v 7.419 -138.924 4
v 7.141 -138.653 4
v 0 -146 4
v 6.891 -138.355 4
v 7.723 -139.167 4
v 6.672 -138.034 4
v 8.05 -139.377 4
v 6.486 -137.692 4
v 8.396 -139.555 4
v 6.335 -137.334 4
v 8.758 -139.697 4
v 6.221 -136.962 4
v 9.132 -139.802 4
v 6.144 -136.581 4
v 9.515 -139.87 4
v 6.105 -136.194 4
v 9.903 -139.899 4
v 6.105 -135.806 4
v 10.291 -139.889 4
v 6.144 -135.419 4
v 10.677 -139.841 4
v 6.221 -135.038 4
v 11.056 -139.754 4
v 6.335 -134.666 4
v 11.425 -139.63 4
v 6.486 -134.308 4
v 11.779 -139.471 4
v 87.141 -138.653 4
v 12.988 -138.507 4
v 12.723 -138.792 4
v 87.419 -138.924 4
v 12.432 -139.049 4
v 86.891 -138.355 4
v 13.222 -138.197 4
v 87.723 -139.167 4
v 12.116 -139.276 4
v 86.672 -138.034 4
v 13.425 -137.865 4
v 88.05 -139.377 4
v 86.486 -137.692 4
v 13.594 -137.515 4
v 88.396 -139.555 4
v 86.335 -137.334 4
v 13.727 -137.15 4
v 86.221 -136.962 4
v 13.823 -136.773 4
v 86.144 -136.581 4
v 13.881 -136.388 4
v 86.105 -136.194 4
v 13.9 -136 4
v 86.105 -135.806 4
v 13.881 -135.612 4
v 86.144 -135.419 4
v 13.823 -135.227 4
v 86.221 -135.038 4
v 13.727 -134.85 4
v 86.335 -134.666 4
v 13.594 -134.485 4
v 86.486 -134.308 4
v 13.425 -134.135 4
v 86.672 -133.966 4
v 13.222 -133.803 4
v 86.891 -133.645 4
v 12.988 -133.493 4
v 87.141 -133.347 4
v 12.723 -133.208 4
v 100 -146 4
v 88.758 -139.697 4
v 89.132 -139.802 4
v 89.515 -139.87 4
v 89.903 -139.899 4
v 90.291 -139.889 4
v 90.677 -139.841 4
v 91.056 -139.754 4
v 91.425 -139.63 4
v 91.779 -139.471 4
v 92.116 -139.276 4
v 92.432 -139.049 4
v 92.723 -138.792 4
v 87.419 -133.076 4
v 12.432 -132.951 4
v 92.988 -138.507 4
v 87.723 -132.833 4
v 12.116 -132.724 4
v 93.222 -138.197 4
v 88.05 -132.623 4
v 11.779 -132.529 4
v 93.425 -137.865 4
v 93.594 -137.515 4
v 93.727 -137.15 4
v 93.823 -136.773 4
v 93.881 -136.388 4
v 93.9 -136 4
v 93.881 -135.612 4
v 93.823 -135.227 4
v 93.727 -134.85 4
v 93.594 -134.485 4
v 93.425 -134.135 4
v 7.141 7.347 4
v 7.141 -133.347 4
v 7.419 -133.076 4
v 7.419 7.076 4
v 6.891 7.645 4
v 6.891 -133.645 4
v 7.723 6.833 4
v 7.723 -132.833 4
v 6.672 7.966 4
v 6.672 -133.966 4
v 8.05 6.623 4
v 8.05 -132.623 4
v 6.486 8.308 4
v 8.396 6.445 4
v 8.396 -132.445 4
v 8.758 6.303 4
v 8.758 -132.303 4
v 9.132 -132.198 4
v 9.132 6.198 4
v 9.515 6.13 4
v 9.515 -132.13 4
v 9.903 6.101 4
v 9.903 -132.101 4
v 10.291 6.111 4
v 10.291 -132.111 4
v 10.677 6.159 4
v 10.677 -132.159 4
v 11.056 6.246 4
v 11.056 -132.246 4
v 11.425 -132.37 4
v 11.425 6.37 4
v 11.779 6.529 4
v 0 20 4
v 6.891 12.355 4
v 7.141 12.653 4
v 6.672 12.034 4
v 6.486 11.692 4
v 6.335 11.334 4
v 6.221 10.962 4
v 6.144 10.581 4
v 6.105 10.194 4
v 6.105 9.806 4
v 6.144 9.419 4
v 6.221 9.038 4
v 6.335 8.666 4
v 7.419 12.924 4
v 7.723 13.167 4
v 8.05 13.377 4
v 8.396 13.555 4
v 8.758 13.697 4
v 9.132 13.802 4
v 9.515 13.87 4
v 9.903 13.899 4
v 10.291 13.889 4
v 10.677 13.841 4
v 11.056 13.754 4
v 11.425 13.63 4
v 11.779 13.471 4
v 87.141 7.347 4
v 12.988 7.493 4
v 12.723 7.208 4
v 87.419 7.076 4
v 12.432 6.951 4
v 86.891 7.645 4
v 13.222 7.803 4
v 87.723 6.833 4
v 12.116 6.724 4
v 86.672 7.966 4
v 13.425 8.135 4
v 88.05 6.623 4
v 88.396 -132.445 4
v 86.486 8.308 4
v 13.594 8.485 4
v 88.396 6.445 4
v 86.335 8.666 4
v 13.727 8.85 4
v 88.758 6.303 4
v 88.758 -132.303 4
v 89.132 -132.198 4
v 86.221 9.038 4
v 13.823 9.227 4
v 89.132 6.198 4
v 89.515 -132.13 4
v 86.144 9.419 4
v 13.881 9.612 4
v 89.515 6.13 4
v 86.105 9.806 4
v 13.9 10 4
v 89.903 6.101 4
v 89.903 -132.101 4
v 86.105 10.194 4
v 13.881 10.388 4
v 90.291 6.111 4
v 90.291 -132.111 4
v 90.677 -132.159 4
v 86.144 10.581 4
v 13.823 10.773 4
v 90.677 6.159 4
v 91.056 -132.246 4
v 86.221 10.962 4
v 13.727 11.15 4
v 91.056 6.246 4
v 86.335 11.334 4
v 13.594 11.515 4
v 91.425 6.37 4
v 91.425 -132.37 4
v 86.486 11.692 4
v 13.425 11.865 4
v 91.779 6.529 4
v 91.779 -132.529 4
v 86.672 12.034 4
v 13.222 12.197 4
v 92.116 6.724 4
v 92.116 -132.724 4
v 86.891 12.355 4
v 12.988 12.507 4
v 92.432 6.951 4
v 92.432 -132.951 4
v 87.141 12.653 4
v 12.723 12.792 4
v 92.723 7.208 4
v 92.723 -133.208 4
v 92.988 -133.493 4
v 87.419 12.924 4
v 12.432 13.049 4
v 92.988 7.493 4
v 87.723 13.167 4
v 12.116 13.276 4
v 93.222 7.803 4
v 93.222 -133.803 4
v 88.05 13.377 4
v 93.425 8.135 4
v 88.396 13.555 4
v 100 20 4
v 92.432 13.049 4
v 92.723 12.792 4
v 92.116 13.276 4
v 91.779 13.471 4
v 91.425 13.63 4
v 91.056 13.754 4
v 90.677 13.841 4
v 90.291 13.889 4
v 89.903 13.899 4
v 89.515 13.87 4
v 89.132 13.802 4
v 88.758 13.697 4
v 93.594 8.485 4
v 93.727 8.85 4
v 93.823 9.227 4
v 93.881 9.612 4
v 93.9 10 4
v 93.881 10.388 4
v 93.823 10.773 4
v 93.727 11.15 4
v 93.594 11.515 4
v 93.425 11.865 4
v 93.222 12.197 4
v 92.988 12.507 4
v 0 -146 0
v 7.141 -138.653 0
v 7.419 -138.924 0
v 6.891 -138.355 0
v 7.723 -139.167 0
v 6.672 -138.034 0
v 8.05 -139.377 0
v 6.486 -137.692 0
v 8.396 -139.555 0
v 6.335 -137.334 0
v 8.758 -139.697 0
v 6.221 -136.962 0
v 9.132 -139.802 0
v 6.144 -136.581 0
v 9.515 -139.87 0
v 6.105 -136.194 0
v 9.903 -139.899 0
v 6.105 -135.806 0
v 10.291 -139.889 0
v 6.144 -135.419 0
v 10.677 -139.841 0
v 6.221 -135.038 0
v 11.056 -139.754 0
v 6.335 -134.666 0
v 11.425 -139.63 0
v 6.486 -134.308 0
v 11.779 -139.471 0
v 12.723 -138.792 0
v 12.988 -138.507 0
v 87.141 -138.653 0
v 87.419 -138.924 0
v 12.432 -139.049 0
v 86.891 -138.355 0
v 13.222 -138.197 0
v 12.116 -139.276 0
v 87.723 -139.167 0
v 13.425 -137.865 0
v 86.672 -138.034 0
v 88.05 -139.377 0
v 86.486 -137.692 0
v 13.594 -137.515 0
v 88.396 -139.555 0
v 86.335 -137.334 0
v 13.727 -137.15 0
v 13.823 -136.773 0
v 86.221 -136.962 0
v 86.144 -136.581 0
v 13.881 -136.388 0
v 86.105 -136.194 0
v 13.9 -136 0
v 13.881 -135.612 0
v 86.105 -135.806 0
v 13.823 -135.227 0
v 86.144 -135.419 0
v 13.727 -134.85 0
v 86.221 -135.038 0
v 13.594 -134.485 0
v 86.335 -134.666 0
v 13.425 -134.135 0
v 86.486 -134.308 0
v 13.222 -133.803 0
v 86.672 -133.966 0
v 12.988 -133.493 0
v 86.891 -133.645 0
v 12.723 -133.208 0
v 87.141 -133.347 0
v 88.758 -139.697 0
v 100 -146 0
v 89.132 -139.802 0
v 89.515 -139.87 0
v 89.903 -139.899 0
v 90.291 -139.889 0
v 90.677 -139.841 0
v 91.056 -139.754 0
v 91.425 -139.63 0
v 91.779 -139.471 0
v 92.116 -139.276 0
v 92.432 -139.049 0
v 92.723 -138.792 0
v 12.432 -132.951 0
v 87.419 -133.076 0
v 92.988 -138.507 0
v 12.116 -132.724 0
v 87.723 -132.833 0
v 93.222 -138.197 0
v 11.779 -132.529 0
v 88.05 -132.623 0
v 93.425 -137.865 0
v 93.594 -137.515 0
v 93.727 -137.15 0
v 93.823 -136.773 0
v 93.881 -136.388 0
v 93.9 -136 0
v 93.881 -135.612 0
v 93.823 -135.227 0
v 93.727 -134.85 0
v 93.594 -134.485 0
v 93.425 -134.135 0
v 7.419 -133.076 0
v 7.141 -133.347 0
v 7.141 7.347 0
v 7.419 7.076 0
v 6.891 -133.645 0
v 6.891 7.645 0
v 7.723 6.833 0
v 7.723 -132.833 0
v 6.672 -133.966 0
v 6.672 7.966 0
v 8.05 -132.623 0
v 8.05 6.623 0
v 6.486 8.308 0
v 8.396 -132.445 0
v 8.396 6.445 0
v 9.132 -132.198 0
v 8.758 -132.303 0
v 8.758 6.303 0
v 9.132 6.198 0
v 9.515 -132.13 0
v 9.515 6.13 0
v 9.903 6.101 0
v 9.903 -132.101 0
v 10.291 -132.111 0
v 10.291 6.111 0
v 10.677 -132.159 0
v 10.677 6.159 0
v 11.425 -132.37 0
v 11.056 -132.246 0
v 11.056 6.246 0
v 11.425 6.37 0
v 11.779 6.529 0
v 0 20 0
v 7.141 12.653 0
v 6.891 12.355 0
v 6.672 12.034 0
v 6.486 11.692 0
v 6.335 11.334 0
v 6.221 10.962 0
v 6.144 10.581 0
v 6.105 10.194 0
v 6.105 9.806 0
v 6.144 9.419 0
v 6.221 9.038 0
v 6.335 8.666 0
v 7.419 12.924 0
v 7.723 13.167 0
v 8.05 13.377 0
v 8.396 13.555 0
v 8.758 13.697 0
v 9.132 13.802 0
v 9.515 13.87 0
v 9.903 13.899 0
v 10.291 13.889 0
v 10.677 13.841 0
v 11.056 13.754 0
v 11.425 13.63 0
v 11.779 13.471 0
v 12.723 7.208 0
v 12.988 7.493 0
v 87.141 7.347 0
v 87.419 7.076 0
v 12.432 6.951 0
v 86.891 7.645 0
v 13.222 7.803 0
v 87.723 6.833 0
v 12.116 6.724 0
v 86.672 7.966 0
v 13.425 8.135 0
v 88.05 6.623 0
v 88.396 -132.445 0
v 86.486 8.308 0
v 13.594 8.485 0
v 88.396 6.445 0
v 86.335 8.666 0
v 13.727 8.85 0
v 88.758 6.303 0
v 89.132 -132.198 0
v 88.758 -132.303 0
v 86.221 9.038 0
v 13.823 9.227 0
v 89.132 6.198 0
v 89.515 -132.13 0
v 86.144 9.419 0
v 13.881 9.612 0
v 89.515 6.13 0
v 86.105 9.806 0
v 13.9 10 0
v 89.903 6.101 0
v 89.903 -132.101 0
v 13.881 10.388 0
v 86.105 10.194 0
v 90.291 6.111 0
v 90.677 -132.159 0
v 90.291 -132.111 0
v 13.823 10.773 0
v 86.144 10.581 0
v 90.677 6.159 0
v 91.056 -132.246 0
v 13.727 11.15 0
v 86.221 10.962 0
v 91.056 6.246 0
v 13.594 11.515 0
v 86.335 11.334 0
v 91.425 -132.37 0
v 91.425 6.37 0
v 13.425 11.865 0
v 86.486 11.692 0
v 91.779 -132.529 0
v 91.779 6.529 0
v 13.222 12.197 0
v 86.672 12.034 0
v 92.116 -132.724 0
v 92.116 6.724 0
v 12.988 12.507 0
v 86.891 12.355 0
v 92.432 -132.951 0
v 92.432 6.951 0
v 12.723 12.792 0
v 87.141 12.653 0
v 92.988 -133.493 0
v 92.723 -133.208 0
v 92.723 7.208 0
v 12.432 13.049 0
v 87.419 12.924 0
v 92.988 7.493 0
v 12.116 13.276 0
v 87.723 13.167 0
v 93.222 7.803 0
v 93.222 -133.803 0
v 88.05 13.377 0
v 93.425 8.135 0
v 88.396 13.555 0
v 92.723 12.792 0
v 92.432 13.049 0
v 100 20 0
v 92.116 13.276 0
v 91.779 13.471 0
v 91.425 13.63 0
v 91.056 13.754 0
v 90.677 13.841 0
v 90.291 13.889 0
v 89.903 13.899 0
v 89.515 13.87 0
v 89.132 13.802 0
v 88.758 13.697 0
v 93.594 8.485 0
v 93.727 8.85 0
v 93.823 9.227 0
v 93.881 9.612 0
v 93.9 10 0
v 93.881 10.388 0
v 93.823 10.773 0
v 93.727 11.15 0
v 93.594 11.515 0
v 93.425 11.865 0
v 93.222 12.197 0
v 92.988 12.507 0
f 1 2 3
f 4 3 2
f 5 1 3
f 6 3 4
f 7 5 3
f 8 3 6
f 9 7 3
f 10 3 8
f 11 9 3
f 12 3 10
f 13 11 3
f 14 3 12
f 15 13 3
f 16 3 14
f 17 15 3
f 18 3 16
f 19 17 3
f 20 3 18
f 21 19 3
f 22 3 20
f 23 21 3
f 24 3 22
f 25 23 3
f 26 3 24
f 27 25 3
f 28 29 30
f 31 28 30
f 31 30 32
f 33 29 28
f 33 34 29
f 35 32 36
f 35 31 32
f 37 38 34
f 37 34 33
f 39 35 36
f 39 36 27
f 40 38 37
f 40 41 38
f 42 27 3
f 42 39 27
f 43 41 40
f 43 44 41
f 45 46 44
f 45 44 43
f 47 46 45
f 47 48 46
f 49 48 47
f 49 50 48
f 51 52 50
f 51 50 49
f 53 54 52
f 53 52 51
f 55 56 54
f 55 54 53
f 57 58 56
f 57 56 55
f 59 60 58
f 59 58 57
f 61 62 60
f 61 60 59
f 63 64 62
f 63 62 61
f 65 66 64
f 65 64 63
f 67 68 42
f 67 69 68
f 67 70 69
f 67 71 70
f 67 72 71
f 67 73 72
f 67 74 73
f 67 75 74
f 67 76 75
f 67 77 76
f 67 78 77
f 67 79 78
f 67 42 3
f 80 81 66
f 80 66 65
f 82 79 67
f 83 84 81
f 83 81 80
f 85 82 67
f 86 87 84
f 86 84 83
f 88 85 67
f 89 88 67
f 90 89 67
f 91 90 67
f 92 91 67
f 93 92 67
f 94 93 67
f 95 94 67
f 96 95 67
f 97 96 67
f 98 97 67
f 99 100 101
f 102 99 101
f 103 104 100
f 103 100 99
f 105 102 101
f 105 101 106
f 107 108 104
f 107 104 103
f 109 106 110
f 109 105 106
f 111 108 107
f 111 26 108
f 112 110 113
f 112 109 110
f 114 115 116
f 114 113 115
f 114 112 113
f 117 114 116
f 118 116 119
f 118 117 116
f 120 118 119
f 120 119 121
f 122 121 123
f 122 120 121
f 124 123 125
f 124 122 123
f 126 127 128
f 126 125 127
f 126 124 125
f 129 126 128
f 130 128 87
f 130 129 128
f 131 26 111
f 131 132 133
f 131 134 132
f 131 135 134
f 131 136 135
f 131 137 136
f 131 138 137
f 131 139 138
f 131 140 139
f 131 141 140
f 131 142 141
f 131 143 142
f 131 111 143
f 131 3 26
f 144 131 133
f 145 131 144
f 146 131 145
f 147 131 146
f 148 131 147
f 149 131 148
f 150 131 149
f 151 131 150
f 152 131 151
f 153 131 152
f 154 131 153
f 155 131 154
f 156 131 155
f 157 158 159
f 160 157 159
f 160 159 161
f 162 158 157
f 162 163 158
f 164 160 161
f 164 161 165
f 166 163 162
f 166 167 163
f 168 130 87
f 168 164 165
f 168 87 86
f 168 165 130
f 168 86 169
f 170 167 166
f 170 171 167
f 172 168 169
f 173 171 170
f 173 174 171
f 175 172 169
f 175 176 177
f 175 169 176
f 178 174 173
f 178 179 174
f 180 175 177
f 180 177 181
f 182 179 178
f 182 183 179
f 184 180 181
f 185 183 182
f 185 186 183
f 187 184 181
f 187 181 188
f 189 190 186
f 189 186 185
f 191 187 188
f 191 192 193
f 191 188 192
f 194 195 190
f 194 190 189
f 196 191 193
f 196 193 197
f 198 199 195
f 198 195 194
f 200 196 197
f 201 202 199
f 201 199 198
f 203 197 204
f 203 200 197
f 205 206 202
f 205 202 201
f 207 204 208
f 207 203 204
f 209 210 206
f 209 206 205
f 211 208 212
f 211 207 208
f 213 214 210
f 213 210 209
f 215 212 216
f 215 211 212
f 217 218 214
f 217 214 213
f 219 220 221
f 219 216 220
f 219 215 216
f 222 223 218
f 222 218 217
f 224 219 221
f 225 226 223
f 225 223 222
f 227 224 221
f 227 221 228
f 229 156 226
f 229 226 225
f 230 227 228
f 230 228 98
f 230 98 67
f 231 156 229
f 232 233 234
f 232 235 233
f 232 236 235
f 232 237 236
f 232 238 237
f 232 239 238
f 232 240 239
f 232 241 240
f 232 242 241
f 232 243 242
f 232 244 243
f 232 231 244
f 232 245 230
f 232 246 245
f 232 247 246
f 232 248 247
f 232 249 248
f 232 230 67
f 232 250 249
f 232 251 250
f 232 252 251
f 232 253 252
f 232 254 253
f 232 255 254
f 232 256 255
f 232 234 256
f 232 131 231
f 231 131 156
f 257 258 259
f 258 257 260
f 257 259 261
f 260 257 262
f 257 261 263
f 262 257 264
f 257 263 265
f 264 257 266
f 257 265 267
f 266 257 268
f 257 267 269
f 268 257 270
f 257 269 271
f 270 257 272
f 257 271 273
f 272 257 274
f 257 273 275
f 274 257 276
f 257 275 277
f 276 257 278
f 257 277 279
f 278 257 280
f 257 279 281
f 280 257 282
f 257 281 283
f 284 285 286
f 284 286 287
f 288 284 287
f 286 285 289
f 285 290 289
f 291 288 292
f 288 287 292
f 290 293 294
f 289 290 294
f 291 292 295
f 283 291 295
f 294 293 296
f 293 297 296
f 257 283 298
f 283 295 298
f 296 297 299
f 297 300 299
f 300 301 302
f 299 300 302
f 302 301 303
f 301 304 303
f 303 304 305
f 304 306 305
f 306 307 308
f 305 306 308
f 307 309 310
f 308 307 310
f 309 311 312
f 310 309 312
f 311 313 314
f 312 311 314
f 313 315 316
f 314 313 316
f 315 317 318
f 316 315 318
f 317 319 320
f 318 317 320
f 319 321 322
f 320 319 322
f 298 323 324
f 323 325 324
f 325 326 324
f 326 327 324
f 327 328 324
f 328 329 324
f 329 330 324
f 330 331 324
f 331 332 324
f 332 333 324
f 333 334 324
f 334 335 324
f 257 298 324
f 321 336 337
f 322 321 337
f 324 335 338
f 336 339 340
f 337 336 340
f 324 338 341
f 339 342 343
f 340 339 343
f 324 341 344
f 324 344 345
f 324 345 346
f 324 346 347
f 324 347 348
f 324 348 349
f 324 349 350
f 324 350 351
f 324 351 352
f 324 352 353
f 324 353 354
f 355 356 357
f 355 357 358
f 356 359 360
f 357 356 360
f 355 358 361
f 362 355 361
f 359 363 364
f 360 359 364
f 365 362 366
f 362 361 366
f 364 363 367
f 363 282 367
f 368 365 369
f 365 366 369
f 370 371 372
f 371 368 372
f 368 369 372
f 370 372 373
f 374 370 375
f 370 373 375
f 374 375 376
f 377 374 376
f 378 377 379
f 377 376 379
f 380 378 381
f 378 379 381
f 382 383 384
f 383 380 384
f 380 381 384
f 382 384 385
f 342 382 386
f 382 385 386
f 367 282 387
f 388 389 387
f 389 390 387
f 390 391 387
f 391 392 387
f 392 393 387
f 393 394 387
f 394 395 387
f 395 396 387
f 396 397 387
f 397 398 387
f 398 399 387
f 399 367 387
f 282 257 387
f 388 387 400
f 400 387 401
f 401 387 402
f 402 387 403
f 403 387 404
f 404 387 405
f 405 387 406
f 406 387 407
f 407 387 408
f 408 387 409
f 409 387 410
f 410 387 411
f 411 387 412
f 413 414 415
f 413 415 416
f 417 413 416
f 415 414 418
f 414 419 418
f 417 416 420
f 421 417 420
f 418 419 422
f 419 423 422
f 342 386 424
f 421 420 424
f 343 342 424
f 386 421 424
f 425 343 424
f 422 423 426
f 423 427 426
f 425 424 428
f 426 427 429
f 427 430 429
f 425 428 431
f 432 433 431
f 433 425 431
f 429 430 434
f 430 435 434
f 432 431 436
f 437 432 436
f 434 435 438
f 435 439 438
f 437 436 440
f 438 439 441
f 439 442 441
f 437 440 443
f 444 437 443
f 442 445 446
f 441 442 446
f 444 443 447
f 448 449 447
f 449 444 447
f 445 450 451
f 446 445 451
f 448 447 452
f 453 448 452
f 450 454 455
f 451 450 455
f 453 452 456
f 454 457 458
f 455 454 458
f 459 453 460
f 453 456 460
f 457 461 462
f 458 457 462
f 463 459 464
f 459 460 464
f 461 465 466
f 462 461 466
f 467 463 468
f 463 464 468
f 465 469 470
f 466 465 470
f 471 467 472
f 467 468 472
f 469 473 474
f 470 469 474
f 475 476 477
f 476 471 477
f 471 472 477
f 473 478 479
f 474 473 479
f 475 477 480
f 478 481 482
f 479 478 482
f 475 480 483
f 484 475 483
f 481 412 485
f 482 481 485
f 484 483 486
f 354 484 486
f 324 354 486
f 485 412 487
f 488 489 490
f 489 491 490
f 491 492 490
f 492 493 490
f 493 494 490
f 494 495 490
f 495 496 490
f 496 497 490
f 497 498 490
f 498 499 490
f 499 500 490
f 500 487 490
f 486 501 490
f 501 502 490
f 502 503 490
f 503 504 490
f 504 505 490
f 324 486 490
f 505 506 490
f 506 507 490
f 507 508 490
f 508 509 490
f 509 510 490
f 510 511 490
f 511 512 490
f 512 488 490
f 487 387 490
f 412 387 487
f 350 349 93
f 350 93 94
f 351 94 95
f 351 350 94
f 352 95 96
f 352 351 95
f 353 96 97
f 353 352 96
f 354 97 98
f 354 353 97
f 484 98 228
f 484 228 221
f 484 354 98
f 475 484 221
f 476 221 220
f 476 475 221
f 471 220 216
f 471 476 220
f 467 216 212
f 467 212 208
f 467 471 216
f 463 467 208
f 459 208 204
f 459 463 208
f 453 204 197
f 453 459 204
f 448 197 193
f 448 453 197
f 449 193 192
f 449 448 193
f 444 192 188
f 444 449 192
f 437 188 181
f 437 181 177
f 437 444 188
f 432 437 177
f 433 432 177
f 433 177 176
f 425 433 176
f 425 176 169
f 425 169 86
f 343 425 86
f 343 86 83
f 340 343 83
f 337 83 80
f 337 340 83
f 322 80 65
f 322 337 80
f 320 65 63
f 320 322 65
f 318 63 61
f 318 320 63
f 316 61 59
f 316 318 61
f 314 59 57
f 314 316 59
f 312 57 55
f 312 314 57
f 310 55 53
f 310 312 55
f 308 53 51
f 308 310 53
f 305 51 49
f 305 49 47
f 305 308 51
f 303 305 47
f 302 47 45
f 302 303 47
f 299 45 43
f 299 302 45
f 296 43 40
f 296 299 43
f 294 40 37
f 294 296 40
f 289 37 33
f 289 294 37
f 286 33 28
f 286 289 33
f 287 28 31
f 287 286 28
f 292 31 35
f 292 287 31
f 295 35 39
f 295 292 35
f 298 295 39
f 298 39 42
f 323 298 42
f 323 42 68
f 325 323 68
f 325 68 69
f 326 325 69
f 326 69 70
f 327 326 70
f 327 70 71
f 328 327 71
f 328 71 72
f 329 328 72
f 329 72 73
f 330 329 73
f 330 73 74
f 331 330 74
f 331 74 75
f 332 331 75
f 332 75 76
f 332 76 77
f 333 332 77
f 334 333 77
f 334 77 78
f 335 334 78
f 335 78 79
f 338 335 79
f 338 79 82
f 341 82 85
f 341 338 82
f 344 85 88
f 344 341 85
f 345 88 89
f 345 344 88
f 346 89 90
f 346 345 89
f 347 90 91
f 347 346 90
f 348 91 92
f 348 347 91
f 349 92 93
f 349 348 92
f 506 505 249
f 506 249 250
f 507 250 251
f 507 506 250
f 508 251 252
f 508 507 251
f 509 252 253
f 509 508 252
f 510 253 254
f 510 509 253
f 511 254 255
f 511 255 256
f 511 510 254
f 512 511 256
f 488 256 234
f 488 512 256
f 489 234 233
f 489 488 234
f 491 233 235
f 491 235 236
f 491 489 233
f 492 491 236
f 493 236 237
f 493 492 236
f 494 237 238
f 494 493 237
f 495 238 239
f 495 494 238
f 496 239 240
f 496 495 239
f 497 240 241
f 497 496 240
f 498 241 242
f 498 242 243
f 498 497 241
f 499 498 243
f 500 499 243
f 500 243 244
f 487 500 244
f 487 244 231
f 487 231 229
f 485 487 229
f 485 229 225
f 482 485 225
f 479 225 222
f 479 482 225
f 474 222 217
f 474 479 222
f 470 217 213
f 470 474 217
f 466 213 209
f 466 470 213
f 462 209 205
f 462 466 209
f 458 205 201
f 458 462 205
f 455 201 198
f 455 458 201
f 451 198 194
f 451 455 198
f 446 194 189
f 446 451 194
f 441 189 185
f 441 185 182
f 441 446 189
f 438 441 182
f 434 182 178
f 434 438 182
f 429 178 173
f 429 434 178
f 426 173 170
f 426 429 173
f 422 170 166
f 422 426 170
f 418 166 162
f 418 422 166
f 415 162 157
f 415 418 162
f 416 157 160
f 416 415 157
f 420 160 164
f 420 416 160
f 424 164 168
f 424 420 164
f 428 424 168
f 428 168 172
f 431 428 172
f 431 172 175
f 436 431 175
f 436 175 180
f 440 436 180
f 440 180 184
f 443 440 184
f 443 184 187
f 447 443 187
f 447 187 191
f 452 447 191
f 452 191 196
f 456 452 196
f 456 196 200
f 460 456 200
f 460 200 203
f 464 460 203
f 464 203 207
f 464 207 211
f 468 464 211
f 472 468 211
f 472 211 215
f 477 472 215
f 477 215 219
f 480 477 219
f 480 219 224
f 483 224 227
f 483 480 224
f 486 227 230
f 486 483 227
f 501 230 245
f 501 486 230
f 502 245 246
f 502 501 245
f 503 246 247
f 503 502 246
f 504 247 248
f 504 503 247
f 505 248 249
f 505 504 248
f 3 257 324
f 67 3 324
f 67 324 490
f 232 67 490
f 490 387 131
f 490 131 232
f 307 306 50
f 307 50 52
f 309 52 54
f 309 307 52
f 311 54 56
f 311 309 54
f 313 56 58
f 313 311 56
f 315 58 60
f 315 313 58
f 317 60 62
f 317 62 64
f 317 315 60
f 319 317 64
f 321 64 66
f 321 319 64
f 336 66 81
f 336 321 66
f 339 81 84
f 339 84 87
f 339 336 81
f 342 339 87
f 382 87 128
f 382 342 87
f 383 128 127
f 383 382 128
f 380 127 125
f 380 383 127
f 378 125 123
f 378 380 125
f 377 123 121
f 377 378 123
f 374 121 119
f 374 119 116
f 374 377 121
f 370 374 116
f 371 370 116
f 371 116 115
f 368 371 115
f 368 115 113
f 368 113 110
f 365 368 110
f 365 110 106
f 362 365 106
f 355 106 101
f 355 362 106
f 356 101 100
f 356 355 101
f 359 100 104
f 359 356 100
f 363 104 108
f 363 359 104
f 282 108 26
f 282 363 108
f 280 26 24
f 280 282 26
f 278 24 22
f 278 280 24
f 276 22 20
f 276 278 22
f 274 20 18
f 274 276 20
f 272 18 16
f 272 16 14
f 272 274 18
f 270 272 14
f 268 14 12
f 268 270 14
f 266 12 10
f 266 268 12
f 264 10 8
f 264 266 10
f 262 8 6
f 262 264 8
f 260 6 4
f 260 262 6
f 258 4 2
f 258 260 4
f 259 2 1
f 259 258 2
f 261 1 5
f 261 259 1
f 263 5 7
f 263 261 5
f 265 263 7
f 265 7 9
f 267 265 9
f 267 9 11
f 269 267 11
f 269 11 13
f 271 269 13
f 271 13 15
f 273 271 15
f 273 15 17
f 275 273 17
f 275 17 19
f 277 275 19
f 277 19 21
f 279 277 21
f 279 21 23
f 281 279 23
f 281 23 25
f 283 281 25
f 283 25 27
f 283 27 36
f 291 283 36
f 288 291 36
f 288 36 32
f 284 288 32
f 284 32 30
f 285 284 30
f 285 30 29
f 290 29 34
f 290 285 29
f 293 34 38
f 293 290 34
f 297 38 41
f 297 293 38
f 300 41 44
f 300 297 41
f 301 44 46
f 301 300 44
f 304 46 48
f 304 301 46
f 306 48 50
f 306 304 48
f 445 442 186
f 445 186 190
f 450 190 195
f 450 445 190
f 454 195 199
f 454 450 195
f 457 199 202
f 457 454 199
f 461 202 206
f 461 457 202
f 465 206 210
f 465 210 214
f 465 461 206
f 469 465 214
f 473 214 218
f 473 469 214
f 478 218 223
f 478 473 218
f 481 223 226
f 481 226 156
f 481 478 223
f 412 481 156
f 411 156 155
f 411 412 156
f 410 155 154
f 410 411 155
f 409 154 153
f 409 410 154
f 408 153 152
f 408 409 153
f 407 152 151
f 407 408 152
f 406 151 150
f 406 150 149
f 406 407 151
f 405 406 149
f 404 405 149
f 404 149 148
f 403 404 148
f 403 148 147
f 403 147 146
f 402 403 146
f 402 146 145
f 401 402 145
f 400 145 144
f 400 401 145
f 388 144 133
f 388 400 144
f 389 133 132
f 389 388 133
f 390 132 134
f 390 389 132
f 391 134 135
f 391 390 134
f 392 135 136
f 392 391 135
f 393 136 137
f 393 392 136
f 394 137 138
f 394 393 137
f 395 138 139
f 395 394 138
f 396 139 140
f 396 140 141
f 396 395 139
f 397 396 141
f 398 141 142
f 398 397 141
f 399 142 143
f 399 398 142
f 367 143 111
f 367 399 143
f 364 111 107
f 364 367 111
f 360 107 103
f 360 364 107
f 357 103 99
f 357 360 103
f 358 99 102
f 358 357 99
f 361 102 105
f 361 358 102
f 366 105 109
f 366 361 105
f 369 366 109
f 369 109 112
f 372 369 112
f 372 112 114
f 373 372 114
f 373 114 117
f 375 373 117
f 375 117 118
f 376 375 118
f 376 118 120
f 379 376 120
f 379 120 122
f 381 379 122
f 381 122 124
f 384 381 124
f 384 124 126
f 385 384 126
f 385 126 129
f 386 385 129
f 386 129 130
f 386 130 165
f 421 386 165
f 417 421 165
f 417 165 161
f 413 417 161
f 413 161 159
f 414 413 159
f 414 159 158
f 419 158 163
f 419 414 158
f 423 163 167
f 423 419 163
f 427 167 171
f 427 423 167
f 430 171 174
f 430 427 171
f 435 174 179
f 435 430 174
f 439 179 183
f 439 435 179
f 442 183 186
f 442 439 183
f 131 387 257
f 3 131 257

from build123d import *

# Parameters (mm, degrees)
F0_W     = 100
F0_H     = 126
F0_H_2   = 20
F0_R     = 3.9
F1_DEPTH = 4


with BuildPart() as f1:
    # F0 (on Top) → F1 (new body)
    with BuildSketch(Plane.XY):
        with Locations((50, -63)):
            Rectangle(F0_W, F0_H)
        with Locations((50, 10)):
            Rectangle(F0_W, F0_H_2)
        with Locations((10, 10)):
            Circle(F0_R, mode=Mode.SUBTRACT)
        with Locations((90, 10)):
            Circle(F0_R, mode=Mode.SUBTRACT)
        with Locations((50, -136)):
            Rectangle(F0_W, F0_H_2)
        with Locations((10, -136)):
            Circle(F0_R, mode=Mode.SUBTRACT)
        with Locations((90, -136)):
            Circle(F0_R, mode=Mode.SUBTRACT)
    extrude(amount=F1_DEPTH)


solid = f1.part
